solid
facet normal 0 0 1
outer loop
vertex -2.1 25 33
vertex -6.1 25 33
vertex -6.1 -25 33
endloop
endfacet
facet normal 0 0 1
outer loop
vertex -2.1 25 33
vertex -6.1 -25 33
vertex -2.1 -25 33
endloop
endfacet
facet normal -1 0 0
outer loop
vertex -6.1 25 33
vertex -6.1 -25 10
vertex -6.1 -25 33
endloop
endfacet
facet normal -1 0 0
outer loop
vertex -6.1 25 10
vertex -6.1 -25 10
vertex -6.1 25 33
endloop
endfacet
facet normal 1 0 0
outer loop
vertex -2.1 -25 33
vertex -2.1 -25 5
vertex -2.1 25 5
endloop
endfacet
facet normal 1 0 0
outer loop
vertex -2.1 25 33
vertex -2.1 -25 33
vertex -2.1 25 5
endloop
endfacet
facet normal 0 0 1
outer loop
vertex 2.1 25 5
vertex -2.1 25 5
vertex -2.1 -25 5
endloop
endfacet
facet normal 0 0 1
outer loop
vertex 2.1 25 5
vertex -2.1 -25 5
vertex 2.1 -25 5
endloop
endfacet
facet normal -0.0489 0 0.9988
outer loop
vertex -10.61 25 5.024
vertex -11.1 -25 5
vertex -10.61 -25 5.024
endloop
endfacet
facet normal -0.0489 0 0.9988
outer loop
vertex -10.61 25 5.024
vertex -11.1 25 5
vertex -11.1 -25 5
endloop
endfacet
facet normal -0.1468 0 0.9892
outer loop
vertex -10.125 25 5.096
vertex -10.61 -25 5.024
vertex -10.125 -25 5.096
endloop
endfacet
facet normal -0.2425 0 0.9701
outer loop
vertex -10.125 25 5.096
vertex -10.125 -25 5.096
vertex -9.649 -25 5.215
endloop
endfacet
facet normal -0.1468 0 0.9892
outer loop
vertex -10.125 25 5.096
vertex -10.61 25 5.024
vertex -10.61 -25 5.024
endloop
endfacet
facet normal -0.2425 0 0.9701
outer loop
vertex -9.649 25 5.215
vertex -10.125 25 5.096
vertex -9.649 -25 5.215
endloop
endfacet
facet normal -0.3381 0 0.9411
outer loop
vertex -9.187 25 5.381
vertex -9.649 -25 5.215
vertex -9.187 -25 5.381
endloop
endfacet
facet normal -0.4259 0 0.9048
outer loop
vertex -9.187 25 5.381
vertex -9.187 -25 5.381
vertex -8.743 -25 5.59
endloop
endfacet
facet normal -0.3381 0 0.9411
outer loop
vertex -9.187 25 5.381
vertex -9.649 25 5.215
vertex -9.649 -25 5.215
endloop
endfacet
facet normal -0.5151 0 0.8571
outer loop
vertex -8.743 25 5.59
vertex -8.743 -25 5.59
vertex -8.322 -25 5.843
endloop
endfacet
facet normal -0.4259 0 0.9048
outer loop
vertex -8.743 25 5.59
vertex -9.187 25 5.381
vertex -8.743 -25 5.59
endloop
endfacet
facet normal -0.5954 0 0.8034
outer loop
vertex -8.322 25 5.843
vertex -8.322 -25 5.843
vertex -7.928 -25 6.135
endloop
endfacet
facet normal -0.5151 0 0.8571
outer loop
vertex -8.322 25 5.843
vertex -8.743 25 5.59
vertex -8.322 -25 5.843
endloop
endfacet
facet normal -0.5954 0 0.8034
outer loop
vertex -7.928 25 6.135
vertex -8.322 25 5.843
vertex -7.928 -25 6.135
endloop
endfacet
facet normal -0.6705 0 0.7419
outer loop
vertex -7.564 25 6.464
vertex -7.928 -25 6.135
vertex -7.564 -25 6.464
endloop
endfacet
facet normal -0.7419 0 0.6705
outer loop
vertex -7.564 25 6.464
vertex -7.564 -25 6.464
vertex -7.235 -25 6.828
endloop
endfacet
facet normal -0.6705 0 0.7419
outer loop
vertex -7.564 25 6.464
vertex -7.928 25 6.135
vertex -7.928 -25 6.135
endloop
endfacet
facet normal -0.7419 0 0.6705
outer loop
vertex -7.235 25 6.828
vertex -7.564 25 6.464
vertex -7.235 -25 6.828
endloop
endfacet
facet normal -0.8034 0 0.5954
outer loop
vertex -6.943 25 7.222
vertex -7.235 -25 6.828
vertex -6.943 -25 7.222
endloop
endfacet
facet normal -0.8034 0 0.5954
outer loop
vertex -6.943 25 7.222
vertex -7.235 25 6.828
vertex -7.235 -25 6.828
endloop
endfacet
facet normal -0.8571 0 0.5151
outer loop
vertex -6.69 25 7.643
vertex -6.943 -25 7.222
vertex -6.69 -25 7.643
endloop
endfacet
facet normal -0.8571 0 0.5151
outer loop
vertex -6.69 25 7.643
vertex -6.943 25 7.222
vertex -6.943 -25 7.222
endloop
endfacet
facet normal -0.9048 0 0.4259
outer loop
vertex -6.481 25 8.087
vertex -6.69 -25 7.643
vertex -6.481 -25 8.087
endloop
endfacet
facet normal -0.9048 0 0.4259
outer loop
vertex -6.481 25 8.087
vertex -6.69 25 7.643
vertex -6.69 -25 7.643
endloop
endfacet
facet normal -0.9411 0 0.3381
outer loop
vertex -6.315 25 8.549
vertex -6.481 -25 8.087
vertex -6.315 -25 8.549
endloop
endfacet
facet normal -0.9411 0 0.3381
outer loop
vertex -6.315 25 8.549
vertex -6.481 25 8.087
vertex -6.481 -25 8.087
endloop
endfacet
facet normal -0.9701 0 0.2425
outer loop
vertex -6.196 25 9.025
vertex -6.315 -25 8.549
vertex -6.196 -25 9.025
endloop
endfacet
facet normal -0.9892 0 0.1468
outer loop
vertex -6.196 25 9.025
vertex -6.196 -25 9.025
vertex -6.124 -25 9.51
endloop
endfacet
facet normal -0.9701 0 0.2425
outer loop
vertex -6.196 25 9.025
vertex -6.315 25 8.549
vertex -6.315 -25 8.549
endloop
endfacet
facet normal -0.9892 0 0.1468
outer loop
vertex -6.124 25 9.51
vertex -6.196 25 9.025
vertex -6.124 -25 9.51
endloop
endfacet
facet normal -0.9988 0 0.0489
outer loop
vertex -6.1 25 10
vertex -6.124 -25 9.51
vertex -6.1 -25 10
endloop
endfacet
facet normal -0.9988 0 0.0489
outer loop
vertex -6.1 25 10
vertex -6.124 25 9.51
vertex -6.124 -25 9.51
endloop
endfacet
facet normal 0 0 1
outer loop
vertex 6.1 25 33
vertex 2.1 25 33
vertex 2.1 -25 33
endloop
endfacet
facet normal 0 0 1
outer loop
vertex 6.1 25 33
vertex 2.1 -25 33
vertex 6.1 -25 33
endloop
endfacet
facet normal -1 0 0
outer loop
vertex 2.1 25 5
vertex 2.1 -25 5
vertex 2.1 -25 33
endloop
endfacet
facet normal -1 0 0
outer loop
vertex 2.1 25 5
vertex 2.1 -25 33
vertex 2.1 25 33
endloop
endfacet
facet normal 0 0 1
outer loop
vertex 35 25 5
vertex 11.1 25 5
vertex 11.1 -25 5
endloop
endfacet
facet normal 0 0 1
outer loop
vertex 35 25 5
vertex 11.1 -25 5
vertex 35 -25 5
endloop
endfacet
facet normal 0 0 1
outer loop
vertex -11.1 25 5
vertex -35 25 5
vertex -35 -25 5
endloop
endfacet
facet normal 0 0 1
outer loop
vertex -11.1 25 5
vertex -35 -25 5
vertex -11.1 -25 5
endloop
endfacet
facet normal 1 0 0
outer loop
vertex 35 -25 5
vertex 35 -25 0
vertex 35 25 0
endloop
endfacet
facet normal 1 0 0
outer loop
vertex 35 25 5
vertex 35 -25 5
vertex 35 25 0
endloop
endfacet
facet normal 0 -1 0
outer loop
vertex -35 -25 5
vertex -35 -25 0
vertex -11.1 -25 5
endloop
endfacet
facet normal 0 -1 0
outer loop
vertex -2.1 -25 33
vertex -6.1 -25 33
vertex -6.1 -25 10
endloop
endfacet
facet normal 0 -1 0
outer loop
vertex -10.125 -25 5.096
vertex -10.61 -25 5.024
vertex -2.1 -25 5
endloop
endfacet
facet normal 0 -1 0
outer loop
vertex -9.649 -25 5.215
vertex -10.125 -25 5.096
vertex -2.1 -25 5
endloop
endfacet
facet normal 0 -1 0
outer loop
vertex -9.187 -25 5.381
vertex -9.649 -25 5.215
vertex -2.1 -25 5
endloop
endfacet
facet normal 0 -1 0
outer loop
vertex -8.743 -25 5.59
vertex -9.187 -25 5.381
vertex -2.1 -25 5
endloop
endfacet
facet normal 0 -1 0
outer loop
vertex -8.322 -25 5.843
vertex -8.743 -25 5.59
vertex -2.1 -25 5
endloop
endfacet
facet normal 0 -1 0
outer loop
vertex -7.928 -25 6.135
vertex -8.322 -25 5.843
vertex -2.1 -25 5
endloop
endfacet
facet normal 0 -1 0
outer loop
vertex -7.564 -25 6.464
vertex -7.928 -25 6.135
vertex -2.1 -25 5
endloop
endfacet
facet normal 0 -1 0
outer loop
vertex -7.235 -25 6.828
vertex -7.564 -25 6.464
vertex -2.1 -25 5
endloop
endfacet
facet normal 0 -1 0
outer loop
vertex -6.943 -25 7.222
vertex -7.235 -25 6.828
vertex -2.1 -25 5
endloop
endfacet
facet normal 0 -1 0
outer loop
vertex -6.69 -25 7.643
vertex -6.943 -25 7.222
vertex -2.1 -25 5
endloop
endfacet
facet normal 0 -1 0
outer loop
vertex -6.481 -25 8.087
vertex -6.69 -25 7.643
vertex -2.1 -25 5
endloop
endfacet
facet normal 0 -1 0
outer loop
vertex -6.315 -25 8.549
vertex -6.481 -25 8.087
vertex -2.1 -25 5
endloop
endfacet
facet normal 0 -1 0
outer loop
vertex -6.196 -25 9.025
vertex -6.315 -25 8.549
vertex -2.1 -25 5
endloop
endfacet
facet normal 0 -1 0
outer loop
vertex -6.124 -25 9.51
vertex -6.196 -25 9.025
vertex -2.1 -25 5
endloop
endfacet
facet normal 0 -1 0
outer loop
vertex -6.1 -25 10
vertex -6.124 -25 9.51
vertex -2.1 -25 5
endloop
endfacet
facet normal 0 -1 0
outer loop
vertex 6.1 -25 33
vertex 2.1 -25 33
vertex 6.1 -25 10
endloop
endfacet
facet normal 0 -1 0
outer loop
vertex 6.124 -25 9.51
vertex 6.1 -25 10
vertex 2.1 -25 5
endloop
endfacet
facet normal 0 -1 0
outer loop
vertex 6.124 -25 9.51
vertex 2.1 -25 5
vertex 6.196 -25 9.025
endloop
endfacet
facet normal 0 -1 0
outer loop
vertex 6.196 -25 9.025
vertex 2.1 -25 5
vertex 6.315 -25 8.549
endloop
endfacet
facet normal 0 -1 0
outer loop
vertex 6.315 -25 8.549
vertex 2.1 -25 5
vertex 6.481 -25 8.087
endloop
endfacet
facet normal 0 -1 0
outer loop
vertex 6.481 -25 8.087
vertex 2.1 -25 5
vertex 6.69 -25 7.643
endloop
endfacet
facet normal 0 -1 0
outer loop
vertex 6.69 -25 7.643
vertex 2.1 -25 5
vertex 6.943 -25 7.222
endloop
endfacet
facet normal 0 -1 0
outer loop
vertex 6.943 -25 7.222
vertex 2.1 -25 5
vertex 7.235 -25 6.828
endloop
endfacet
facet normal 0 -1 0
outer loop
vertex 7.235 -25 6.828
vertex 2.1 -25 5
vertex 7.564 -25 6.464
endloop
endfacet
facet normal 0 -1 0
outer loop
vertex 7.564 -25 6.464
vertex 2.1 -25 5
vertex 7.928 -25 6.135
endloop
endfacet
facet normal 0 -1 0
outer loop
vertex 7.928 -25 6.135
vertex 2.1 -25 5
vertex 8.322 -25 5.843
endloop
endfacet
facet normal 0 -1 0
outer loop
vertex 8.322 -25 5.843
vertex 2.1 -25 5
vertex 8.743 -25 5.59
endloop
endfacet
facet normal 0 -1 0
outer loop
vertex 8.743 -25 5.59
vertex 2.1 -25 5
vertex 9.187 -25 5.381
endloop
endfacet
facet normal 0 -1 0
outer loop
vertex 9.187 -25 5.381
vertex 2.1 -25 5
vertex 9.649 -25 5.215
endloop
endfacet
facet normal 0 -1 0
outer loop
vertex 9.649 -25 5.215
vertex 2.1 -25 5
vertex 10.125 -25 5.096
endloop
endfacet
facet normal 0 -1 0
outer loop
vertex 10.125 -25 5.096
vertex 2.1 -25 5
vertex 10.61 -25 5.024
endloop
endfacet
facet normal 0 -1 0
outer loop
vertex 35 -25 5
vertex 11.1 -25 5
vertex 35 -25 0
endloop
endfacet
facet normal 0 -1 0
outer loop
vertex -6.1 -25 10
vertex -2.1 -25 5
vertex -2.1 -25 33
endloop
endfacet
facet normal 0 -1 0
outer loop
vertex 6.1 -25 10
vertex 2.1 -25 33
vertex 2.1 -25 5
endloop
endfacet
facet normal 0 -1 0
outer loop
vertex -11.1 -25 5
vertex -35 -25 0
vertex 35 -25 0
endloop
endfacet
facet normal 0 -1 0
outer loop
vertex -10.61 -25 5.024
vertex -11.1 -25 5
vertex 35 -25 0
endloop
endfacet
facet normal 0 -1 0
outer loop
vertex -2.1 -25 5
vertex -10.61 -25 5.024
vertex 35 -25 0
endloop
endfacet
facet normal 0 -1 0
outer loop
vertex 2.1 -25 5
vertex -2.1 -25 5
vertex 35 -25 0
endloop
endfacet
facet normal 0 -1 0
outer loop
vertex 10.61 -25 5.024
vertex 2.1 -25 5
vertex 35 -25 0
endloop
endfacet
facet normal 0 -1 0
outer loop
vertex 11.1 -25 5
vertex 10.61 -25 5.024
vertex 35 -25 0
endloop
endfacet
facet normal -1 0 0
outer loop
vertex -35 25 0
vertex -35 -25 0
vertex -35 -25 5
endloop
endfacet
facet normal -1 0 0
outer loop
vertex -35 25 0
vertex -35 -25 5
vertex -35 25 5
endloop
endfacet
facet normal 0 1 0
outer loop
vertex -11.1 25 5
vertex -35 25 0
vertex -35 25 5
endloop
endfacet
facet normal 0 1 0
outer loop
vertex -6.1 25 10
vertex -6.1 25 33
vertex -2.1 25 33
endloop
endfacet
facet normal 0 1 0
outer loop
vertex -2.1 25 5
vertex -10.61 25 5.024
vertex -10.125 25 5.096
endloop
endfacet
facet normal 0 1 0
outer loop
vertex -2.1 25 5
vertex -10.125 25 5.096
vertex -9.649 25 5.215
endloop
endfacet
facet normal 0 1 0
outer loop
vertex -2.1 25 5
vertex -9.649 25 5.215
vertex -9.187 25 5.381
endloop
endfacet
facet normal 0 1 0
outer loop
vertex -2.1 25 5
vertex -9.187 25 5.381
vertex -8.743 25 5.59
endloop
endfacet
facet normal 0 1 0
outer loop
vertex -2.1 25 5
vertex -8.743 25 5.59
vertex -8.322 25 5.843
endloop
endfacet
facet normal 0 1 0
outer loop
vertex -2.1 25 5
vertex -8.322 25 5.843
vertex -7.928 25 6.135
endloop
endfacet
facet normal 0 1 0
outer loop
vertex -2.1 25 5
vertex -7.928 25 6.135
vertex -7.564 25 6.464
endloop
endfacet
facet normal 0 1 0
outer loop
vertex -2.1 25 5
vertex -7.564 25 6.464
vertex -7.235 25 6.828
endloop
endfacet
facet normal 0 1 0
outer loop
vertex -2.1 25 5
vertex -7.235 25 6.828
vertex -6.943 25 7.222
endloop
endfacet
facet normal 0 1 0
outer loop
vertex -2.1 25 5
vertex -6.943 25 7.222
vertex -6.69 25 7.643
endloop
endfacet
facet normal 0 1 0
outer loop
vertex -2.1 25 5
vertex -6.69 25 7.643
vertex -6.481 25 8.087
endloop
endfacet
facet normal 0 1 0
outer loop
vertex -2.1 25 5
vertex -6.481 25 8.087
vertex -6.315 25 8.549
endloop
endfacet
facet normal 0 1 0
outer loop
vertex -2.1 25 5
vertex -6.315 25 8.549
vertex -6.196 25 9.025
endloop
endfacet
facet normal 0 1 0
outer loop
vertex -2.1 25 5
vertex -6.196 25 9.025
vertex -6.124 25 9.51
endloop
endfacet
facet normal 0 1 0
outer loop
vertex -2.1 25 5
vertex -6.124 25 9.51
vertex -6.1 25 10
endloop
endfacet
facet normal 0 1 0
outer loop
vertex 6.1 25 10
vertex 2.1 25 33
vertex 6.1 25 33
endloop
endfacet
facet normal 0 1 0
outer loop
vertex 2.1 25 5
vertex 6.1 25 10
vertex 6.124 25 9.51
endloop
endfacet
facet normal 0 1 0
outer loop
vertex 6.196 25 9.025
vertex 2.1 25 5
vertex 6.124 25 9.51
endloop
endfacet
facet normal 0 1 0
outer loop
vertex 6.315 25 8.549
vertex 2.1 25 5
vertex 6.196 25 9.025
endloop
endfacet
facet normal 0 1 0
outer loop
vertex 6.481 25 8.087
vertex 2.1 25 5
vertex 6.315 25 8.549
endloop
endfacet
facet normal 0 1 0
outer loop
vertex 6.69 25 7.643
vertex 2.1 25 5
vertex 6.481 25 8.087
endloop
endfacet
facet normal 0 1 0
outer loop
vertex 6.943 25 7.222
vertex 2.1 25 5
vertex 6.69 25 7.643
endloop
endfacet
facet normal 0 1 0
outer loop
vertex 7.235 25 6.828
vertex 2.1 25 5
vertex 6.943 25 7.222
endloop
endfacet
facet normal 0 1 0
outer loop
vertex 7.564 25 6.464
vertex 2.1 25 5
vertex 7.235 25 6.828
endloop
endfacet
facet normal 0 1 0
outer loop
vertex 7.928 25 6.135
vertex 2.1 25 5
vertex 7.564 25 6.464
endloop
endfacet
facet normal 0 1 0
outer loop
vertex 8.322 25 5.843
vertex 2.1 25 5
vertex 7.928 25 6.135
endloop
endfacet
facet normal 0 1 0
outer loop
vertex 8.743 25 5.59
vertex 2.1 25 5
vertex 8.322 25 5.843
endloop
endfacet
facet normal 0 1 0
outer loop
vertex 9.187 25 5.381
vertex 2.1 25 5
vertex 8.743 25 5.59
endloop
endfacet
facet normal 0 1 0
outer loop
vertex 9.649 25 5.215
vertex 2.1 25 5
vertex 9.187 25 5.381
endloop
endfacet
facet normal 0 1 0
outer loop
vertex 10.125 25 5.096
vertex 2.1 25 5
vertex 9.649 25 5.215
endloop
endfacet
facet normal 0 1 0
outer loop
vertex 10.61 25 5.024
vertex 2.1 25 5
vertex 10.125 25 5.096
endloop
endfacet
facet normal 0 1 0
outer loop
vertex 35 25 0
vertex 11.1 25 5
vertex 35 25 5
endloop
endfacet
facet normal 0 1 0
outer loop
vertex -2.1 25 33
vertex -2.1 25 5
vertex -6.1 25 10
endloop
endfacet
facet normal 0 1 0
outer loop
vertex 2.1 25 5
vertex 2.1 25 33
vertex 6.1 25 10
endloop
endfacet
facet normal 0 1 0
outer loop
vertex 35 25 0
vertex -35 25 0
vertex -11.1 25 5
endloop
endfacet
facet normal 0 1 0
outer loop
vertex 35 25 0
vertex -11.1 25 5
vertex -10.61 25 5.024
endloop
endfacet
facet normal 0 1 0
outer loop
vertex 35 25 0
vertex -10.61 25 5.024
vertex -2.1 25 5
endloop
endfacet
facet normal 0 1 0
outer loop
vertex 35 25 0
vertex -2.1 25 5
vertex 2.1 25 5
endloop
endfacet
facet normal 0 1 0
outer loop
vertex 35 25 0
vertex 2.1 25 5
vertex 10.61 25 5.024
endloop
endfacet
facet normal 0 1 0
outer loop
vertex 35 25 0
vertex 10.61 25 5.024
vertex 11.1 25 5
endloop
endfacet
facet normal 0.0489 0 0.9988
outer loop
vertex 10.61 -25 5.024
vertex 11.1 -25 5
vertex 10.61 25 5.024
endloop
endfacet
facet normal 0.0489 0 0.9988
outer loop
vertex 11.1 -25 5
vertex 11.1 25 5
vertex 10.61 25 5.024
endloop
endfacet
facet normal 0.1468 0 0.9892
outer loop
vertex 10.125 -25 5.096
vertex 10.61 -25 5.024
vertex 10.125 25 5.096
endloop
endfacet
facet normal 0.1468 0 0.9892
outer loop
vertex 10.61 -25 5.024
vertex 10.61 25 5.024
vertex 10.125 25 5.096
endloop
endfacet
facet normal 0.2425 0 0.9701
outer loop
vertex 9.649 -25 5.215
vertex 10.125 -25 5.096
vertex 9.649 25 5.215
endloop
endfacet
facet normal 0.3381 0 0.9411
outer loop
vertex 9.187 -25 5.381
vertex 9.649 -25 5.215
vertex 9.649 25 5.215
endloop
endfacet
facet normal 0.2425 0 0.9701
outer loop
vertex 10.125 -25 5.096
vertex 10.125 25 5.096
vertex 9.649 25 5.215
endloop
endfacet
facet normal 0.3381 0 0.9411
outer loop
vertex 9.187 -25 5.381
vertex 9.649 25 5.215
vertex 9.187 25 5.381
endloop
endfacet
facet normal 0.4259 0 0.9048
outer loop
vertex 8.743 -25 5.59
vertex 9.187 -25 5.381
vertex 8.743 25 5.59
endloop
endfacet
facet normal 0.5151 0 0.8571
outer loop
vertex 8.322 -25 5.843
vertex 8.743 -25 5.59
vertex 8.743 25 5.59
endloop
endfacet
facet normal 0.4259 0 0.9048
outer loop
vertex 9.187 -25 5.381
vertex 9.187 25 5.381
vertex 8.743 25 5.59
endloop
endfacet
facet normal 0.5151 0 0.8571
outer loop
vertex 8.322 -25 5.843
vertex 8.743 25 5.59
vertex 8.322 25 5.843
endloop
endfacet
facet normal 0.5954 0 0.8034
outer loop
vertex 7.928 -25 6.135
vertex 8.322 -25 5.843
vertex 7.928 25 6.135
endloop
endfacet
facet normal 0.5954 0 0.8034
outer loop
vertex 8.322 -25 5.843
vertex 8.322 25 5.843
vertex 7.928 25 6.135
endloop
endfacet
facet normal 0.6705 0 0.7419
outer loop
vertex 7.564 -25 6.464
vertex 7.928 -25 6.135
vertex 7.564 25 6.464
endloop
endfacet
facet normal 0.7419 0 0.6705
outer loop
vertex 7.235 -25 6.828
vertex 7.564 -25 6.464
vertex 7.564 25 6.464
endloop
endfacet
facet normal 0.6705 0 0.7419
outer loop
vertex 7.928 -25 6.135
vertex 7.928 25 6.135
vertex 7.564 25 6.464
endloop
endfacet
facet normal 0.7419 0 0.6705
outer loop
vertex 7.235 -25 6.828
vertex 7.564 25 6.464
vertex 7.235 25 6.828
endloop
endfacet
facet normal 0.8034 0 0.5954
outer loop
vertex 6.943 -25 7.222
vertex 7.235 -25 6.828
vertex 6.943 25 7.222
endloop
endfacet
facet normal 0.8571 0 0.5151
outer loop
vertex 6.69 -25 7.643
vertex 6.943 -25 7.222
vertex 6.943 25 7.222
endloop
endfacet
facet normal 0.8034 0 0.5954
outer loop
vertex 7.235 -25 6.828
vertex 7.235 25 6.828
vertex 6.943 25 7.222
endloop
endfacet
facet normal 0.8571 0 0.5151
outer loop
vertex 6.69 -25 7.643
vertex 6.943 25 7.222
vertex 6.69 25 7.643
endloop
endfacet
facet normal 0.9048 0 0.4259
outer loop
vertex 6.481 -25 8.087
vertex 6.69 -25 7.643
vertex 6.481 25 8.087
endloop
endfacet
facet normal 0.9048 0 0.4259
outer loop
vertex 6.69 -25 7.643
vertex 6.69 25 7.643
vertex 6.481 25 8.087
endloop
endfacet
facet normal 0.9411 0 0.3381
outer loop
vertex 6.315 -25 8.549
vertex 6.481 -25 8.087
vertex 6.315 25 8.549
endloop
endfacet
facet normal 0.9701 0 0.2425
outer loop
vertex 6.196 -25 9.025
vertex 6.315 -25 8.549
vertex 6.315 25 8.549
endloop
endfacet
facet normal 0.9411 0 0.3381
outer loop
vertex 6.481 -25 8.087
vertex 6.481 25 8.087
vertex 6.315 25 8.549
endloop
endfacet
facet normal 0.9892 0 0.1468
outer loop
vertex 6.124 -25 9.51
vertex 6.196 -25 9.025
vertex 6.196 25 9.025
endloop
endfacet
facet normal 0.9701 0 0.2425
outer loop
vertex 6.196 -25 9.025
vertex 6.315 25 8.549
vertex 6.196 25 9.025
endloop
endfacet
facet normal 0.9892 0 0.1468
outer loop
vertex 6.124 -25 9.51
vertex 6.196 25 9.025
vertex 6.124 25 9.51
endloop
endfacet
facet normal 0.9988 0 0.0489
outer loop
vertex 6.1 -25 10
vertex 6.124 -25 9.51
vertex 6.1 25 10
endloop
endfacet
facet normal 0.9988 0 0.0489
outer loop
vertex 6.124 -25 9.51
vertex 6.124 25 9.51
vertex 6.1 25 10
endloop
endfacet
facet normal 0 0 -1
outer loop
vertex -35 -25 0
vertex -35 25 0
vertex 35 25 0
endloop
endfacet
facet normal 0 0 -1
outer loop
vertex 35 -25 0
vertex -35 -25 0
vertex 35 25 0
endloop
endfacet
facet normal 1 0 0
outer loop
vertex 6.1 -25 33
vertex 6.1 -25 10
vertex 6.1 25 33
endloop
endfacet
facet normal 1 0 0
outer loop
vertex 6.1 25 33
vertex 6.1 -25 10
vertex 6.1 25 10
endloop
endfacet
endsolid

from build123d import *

# Parameters (mm, degrees)
F0_W     = 70
F0_H     = 50
F1_DEPTH = 5
F2_W     = 4
F2_H     = 50
F3_DEPTH = 28
F4_R     = 5


with BuildPart() as f1:
    # F0 (on Top) → F1 (new body)
    with BuildSketch(Plane.XY):
        Rectangle(F0_W, F0_H)
    extrude(amount=F1_DEPTH)

    # F2 (on face) → F3 (join)
    with BuildSketch(Plane.XY.offset(5)):
        with Locations((-4.1, 0)):
            Rectangle(F2_W, F2_H)
        with Locations((4.1, 0)):
            Rectangle(F2_W, F2_H)
    extrude(amount=F3_DEPTH)

    # F4
    f4_edges = [f1.edges().sort_by_distance(p)[0] for p in [
        (-6.1, 0, 5),
        (6.1, 0, 5),
    ]]
    fillet(f4_edges, radius=F4_R)


solid = f1.part
